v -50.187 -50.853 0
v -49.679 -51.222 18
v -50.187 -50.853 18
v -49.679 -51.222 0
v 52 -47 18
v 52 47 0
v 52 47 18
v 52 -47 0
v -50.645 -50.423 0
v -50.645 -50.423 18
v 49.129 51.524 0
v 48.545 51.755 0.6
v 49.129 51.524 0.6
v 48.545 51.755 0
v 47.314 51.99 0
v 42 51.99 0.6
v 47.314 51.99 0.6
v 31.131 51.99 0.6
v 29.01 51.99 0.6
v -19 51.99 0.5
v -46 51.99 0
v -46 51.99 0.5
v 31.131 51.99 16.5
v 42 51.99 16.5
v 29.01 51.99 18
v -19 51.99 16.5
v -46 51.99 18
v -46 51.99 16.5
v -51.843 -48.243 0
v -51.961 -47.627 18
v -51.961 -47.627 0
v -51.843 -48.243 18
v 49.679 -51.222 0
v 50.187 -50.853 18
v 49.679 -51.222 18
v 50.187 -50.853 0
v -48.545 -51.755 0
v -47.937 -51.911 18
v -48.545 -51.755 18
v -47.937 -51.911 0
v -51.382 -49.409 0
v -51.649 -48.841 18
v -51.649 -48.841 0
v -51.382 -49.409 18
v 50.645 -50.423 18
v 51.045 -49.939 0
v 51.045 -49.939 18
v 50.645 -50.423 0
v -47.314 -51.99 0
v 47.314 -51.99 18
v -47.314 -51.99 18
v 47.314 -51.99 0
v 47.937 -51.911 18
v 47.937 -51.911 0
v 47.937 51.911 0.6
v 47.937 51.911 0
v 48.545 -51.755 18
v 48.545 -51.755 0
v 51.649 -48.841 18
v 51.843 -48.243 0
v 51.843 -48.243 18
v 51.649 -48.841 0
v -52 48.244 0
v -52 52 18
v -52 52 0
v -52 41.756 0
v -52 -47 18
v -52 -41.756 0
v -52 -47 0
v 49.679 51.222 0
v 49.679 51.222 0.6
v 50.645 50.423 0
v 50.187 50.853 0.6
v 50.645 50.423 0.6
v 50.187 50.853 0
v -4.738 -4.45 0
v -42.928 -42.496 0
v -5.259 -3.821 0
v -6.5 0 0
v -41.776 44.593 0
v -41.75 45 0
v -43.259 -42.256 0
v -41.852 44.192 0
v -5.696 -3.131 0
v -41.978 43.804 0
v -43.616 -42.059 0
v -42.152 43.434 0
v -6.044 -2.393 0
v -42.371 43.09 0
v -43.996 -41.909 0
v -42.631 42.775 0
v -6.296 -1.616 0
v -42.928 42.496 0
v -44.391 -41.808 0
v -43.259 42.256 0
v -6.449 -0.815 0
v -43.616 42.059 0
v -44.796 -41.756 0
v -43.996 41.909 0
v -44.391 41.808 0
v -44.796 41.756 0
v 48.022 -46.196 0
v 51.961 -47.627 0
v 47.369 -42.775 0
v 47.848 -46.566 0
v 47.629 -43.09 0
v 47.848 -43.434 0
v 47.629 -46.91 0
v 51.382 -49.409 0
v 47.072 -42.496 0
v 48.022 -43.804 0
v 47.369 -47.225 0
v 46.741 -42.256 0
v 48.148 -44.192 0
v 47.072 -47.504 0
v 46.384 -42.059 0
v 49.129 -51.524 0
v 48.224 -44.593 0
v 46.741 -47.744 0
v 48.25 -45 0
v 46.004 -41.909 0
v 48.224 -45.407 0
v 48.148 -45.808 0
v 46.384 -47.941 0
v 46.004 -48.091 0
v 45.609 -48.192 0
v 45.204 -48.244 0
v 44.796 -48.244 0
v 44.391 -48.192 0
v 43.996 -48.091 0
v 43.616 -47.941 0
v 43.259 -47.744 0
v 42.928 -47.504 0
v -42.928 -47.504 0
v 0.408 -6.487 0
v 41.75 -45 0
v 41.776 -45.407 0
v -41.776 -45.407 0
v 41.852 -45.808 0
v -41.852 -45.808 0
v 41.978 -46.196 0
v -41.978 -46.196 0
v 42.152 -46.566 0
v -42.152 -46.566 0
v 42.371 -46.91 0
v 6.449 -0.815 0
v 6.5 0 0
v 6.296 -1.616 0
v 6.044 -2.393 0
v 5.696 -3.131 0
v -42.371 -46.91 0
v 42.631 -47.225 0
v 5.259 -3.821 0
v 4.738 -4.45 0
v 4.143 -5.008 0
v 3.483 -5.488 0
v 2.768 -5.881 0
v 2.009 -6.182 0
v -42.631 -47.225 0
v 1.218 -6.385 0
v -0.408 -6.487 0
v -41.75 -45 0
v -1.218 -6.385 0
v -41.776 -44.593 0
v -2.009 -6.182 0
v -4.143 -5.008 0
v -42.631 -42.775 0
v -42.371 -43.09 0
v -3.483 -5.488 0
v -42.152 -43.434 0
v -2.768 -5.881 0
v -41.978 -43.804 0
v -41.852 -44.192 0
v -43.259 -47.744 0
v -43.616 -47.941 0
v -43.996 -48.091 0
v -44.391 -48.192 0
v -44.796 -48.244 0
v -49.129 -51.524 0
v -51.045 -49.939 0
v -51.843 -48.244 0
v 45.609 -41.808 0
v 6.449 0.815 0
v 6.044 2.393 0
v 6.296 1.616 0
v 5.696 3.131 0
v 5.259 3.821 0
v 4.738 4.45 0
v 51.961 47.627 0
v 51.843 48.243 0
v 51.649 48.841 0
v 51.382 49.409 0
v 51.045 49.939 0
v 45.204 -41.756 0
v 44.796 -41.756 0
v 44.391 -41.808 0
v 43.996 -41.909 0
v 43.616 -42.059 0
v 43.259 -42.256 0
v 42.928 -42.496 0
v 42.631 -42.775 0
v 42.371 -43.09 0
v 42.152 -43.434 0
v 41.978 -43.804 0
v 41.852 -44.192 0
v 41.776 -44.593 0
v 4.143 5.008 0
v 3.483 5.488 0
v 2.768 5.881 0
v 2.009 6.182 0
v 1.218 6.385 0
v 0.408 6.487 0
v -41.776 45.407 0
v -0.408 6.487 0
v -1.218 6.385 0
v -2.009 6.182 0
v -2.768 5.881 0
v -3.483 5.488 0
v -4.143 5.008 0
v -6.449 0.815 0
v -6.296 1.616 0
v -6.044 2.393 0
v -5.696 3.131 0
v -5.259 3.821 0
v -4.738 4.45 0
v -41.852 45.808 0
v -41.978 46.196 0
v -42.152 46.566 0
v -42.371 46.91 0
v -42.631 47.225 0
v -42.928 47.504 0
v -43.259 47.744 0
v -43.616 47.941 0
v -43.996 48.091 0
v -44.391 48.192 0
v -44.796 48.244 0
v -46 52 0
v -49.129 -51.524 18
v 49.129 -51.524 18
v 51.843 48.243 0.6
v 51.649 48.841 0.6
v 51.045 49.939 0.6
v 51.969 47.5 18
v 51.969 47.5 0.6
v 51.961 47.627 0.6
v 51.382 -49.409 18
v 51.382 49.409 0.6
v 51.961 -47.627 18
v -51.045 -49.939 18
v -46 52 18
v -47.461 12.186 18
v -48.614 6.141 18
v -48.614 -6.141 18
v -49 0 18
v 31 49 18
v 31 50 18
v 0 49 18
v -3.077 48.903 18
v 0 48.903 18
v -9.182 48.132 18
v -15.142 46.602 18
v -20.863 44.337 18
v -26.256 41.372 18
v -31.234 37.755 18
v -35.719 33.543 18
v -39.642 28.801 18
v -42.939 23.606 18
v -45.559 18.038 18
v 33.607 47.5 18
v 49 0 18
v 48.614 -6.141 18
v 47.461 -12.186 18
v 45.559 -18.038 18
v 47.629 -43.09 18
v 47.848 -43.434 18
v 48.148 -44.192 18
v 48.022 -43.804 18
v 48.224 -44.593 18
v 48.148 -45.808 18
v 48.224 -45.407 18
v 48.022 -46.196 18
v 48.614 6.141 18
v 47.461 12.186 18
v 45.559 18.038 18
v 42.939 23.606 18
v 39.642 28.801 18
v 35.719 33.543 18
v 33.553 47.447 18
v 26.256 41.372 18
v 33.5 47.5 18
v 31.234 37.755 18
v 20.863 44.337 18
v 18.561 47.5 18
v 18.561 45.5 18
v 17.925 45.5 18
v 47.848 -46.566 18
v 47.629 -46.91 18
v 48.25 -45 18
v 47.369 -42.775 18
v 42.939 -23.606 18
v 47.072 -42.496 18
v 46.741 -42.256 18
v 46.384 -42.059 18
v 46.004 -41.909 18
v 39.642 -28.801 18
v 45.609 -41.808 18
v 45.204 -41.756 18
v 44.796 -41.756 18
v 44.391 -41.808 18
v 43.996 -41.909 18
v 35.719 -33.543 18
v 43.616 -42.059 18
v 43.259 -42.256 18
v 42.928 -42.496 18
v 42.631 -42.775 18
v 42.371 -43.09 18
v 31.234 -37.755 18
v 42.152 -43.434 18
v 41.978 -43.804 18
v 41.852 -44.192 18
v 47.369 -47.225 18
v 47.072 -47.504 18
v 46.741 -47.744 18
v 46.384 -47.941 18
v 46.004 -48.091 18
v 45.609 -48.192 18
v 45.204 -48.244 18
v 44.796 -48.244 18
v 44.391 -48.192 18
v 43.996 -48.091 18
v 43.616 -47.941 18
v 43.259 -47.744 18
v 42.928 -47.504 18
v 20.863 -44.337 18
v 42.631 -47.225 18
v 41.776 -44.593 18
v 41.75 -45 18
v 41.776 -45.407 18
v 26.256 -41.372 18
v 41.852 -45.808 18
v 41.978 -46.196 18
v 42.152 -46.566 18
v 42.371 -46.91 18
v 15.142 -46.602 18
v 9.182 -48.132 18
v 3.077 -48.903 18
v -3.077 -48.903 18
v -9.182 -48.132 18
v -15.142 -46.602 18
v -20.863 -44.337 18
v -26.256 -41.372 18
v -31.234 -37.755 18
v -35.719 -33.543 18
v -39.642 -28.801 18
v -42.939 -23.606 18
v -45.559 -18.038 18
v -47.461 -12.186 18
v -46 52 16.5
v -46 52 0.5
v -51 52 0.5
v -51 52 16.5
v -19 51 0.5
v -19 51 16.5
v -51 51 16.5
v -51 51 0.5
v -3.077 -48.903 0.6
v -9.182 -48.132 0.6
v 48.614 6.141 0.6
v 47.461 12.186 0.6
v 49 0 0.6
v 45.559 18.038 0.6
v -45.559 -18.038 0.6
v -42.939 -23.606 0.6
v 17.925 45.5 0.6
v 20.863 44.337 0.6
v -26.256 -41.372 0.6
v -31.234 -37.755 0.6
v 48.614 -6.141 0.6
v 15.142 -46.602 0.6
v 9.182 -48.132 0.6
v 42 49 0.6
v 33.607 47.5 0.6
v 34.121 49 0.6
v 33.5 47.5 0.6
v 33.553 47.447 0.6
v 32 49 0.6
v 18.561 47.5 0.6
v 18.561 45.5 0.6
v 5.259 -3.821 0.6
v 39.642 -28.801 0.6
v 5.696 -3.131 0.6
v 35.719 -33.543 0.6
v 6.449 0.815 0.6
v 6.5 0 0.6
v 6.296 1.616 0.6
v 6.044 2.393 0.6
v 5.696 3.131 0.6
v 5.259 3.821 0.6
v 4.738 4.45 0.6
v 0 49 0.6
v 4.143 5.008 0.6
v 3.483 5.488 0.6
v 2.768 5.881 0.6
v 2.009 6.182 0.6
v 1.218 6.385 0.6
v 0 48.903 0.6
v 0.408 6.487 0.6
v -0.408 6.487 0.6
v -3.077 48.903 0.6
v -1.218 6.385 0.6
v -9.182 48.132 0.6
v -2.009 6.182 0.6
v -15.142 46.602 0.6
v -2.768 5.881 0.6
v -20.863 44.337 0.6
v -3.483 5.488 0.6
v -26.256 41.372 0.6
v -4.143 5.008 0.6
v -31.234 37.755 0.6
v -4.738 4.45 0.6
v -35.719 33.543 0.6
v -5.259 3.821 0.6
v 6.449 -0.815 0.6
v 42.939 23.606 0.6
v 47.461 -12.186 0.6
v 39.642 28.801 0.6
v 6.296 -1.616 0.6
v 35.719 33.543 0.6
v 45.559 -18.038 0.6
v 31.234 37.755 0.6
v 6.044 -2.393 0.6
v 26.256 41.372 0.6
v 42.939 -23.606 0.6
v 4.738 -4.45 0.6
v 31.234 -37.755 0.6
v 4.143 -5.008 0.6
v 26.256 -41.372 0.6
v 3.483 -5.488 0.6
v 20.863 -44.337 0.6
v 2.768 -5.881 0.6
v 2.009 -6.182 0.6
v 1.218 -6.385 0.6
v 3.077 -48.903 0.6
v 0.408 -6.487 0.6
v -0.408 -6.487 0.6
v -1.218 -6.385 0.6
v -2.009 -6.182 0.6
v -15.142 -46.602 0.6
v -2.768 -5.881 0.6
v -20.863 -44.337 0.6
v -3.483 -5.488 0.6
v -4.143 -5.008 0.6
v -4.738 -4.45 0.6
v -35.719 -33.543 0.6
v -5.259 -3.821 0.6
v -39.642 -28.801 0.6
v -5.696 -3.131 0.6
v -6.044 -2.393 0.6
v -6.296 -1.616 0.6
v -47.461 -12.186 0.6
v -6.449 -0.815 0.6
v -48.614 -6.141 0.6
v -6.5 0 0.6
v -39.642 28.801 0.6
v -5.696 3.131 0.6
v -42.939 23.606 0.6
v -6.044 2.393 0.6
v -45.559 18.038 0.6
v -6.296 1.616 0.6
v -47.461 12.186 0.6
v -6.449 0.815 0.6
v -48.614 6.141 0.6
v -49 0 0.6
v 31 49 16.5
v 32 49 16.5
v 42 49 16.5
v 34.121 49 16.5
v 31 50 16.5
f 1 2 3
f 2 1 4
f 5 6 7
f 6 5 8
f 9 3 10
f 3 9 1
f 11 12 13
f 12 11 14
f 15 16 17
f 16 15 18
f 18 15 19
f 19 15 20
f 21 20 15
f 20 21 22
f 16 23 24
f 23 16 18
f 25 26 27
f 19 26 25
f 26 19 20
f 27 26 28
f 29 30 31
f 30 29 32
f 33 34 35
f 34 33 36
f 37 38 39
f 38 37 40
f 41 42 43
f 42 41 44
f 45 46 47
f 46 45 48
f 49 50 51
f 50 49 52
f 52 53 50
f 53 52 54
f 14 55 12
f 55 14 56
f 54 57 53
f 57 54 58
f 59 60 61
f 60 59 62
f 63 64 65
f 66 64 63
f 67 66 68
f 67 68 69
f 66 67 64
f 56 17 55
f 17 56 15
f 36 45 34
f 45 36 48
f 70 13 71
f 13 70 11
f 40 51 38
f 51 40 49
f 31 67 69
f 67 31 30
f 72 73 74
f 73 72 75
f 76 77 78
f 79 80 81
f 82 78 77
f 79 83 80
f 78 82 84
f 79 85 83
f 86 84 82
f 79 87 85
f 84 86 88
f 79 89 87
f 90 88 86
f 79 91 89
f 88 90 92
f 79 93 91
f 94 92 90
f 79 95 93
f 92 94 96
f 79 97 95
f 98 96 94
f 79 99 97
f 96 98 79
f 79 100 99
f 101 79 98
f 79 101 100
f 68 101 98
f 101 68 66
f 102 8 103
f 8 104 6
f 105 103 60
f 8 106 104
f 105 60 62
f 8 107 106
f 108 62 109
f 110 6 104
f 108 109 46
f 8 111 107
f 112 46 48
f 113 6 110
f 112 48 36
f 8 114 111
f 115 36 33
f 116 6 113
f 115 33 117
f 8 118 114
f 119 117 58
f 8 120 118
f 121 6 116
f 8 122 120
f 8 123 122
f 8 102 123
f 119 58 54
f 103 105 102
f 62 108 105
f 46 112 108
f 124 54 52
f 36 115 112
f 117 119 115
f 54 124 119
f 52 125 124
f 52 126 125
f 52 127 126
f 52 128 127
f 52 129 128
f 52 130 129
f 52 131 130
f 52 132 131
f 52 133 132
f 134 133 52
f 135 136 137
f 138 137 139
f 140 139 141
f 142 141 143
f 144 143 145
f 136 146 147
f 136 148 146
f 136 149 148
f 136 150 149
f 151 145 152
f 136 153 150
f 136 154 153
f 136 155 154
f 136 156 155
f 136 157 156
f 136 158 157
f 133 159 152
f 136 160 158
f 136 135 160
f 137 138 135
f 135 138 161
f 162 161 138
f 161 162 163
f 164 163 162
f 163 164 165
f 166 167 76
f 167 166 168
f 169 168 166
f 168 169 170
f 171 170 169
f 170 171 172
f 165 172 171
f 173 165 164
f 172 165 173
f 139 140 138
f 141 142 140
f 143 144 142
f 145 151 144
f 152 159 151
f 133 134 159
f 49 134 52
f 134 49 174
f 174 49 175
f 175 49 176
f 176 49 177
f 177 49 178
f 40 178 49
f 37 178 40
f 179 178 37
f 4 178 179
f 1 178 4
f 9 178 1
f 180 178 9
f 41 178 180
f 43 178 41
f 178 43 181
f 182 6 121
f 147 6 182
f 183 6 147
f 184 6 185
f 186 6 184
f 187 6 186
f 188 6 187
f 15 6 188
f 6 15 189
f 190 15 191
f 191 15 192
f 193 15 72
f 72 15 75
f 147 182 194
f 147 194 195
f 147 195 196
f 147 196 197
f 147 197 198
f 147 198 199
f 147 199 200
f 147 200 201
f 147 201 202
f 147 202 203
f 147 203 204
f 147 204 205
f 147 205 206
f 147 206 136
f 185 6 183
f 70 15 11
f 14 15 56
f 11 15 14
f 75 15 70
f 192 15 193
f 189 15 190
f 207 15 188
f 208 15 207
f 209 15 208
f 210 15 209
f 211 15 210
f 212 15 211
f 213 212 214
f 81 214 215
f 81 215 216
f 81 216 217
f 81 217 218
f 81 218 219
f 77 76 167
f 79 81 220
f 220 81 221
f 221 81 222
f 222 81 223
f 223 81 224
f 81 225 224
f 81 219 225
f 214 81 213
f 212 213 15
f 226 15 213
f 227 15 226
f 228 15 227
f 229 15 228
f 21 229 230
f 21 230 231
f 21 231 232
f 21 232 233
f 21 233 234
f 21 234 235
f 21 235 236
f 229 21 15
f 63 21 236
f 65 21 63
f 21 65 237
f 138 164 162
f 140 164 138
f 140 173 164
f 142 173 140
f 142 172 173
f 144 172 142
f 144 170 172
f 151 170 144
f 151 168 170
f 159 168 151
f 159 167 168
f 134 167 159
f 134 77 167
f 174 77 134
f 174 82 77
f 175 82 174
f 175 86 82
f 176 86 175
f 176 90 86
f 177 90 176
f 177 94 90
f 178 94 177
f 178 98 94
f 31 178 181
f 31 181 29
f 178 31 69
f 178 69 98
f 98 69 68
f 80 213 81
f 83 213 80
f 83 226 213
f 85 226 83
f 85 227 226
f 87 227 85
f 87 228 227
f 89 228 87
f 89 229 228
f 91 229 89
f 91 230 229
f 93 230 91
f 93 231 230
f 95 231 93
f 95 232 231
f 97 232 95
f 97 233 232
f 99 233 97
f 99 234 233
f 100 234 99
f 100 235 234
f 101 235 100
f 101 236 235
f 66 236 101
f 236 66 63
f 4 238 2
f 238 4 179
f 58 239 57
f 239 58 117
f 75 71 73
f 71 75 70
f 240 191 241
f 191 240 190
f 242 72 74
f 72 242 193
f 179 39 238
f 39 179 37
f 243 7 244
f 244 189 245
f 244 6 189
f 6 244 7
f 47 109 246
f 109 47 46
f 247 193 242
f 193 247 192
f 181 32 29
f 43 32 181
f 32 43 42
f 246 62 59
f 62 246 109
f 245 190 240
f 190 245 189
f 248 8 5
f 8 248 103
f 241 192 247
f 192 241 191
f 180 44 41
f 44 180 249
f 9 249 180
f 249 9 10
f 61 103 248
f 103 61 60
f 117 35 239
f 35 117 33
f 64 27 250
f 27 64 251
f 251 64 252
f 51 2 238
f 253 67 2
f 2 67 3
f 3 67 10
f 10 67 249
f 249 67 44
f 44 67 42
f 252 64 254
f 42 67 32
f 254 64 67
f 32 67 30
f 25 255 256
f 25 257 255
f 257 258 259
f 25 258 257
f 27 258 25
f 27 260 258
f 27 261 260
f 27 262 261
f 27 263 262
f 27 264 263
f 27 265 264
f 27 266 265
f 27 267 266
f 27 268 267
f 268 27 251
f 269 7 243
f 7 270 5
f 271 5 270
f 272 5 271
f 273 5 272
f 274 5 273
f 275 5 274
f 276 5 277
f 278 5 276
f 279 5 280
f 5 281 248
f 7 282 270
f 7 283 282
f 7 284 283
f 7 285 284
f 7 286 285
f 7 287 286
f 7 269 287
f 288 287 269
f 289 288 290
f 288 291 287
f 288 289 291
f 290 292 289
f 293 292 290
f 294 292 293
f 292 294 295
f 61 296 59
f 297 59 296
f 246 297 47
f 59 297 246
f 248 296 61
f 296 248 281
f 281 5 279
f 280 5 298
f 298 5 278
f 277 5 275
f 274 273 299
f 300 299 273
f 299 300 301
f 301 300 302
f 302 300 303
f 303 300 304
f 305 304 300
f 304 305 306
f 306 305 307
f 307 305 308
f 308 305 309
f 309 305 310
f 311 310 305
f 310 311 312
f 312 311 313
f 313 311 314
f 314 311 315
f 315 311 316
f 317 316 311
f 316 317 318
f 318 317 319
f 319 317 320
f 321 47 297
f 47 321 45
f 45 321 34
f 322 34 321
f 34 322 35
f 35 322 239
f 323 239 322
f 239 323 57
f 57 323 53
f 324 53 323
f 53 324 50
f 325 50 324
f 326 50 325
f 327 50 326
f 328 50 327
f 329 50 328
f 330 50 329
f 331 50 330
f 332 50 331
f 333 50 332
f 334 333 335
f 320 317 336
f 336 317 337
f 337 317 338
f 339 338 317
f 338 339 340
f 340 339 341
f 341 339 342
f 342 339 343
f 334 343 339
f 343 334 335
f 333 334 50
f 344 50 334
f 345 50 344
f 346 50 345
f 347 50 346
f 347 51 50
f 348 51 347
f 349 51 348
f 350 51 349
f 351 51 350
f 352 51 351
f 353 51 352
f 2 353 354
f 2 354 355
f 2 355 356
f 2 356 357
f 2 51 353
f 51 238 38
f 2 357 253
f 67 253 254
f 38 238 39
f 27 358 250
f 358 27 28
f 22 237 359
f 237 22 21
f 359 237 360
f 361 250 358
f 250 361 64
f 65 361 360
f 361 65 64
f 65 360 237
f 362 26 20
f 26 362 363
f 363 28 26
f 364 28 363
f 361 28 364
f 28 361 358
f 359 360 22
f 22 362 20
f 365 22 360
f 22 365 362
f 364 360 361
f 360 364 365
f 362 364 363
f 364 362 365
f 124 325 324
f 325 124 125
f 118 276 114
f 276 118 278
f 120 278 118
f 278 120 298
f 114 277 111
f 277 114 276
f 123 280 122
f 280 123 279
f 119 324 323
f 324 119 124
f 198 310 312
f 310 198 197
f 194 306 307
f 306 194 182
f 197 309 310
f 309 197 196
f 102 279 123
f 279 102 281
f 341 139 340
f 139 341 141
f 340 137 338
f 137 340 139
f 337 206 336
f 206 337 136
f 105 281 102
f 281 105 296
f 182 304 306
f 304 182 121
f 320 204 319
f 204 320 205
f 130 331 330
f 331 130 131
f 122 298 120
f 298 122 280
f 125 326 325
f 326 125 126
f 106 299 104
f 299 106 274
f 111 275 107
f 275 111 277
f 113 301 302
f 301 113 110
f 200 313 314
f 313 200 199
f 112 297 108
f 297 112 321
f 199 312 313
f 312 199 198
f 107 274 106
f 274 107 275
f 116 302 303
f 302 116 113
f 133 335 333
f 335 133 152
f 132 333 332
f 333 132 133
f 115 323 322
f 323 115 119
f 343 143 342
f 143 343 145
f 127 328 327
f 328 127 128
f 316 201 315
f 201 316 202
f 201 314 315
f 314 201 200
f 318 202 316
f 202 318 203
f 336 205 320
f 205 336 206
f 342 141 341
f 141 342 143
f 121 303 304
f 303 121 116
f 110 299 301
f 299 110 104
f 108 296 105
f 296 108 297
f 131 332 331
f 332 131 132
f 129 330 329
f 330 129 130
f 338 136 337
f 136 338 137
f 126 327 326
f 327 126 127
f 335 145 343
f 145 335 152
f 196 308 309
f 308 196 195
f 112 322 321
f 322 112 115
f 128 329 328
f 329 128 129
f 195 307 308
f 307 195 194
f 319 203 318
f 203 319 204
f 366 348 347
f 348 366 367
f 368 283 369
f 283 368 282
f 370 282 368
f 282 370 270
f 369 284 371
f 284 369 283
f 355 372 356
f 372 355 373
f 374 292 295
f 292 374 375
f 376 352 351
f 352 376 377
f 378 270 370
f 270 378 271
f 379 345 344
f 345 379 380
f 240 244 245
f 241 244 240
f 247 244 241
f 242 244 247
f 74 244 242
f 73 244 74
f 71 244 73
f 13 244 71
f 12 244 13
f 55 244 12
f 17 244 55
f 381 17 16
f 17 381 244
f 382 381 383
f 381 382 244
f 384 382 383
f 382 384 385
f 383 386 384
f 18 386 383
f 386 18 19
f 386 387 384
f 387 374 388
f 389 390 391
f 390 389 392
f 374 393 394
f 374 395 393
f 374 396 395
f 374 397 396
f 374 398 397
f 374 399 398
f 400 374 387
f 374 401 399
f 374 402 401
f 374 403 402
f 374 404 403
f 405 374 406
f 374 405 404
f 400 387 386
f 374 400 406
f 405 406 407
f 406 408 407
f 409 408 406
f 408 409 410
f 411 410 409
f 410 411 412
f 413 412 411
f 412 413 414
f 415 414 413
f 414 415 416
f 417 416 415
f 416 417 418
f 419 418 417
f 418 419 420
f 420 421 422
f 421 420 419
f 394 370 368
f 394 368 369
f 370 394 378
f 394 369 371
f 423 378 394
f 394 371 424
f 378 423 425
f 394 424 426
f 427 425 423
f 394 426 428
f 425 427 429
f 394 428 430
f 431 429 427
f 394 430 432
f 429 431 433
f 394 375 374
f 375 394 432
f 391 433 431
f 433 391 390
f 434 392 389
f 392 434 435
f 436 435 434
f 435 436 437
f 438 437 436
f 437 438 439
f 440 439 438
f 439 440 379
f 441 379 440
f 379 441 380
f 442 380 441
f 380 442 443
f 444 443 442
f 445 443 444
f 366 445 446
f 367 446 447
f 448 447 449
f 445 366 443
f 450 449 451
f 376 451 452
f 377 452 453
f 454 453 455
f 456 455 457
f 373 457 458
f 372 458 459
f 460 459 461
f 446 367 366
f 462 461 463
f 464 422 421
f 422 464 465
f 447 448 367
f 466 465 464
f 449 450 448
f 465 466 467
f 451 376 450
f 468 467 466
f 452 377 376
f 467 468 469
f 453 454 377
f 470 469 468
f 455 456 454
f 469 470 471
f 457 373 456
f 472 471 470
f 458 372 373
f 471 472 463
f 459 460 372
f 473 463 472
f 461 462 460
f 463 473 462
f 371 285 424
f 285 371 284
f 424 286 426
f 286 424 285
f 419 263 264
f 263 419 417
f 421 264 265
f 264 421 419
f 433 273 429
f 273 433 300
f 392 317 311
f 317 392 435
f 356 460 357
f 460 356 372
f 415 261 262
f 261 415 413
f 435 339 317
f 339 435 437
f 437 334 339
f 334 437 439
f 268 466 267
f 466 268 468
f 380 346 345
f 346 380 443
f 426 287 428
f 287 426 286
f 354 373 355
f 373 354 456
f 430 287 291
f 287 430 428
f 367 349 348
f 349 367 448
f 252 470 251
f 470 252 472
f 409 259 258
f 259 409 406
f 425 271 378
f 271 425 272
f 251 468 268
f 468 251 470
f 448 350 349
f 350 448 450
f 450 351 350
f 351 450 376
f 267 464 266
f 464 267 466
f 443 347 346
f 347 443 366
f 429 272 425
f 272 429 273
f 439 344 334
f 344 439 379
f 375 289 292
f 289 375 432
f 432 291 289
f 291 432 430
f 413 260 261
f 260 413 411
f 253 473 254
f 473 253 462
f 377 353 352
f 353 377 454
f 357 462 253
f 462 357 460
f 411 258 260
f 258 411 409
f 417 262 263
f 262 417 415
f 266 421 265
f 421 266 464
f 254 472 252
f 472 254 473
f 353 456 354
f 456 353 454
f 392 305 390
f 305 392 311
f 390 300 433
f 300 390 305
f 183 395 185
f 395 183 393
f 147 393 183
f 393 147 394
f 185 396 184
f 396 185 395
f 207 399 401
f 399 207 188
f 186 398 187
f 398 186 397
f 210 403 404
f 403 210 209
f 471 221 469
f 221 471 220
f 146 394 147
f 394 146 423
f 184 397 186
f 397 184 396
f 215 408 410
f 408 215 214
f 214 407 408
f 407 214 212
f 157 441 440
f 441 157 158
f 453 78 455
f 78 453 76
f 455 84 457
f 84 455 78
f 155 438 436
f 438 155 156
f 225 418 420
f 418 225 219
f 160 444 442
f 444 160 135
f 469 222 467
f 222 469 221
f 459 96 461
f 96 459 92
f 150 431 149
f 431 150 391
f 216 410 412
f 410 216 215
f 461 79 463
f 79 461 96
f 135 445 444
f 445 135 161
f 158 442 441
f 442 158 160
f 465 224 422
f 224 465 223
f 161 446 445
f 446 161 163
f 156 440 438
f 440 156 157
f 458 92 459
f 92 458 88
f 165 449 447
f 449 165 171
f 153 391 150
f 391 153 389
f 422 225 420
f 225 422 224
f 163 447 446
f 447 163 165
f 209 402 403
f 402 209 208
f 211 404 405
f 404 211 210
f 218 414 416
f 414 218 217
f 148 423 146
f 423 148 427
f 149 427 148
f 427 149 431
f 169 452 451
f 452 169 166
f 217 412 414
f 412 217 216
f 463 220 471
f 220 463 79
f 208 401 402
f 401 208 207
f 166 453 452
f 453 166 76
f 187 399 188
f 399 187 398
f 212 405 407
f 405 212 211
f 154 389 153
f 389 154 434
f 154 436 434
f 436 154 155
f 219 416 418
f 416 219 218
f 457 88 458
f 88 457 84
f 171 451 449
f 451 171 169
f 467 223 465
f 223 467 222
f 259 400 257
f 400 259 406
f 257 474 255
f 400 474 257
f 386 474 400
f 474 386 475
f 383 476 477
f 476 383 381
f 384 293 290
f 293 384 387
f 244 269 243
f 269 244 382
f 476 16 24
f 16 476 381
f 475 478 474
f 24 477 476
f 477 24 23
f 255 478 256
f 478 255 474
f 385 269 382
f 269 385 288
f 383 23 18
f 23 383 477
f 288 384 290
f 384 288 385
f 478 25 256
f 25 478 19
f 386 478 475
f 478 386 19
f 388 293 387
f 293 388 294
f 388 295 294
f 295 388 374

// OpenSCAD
$fn = 50;


difference() {
	union() {
		hull() {
			translate(v = [-47.0000000000, 47.0000000000, 0]) {
				cylinder(h = 18, r = 5);
			}
			translate(v = [47.0000000000, 47.0000000000, 0]) {
				cylinder(h = 18, r = 5);
			}
			translate(v = [-47.0000000000, -47.0000000000, 0]) {
				cylinder(h = 18, r = 5);
			}
			translate(v = [47.0000000000, -47.0000000000, 0]) {
				cylinder(h = 18, r = 5);
			}
		}
		translate(v = [-52.0000000000, 46.0000000000, 0]) {
			cube(size = [6, 6, 18]);
		}
	}
	union() {
		translate(v = [-52.5000000000, -45.0000000000, -250.0000000000]) {
			rotate(a = [0, 0, 0]) {
				difference() {
					union() {
						hull() {
							translate(v = [7.5000000000, 0, 0]) {
								cylinder(h = 250, r = 3.2500000000, r1 = 3.2500000000, r2 = 3.2500000000);
							}
							translate(v = [-7.5000000000, 0, 0]) {
								cylinder(h = 250, r = 3.2500000000, r1 = 3.2500000000, r2 = 3.2500000000);
							}
						}
					}
					union();
				}
			}
		}
		translate(v = [-52.5000000000, 45.0000000000, -250.0000000000]) {
			rotate(a = [0, 0, 0]) {
				difference() {
					union() {
						hull() {
							translate(v = [7.5000000000, 0, 0]) {
								cylinder(h = 250, r = 3.2500000000, r1 = 3.2500000000, r2 = 3.2500000000);
							}
							translate(v = [-7.5000000000, 0, 0]) {
								cylinder(h = 250, r = 3.2500000000, r1 = 3.2500000000, r2 = 3.2500000000);
							}
						}
					}
					union();
				}
			}
		}
		translate(v = [-51.0000000000, 51.0000000000, 0.5000000000]) {
			cube(size = [32, 1, 16]);
		}
		translate(v = [45.0000000000, -45.0000000000, -50.0000000000]) {
			cylinder(h = 100, r = 3.2500000000);
		}
		translate(v = [0, 0, 0.6000000000]) {
			cylinder(h = 20.4000000000, r = 49.0000000000);
		}
		translate(v = [0, 0, -9.0000000000]) {
			cylinder(h = 18, r = 6.5000000000);
		}
		translate(v = [0.0000000000, 47.5000000000, 0.6000000000]) {
			cube(size = [52.0000000000, 1.5000000000, 20.4000000000]);
		}
		translate(v = [42.0000000000, 47.5000000000, 0.6000000000]) {
			cube(size = [10, 4.5000000000, 20.4000000000]);
		}
		translate(v = [31.0000000000, 47.5000000000, 16.5000000000]) {
			cube(size = [21, 4.5000000000, 1.5000000000]);
		}
		translate(v = [28.2500000000, 52.7500000000, 0.6000000000]) {
			rotate(a = [0, 0, -45]) {
				cube(size = [7.5000000000, 1.5000000000, 20.4000000000]);
			}
		}
		translate(v = [11.0610000000, 45.5000000000, 0.6000000000]) {
			cube(size = [7.5000000000, 2, 17.4000000000]);
		}
	}
}
